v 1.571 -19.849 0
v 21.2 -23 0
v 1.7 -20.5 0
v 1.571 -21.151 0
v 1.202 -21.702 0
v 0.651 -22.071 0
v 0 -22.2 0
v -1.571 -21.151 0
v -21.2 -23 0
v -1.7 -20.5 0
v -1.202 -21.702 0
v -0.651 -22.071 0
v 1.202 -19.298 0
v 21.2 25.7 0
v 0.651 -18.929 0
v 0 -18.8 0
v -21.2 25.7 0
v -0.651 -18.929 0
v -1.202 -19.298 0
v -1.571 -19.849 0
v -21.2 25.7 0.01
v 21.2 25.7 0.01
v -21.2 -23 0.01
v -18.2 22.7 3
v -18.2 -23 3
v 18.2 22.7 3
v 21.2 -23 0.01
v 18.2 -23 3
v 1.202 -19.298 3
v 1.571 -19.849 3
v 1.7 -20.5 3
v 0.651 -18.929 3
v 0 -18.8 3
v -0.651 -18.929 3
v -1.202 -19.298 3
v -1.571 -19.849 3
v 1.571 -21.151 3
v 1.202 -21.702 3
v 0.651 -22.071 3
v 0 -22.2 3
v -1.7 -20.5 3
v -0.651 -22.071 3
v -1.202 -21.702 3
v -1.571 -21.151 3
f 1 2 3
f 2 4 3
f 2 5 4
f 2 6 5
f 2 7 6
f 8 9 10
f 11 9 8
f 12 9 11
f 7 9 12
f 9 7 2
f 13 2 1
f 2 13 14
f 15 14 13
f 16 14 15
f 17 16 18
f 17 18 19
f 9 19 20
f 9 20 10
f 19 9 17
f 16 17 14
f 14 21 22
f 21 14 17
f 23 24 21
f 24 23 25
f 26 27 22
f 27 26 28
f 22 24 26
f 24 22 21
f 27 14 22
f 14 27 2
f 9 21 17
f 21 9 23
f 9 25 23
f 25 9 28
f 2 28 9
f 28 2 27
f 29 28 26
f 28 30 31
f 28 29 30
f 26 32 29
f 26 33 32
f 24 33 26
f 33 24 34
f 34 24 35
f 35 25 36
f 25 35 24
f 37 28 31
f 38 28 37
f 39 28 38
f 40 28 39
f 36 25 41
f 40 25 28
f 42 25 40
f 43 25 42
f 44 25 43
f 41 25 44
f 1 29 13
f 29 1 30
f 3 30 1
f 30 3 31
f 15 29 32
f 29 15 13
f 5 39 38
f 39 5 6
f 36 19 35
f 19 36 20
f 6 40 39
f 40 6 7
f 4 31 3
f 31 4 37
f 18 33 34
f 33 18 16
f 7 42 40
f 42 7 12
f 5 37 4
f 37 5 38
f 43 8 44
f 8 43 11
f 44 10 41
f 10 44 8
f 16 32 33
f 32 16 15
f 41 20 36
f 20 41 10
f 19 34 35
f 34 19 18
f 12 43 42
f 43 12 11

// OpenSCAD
include <../lib/solar-node-lib.scad>;
$fn = 40;
door_print();
